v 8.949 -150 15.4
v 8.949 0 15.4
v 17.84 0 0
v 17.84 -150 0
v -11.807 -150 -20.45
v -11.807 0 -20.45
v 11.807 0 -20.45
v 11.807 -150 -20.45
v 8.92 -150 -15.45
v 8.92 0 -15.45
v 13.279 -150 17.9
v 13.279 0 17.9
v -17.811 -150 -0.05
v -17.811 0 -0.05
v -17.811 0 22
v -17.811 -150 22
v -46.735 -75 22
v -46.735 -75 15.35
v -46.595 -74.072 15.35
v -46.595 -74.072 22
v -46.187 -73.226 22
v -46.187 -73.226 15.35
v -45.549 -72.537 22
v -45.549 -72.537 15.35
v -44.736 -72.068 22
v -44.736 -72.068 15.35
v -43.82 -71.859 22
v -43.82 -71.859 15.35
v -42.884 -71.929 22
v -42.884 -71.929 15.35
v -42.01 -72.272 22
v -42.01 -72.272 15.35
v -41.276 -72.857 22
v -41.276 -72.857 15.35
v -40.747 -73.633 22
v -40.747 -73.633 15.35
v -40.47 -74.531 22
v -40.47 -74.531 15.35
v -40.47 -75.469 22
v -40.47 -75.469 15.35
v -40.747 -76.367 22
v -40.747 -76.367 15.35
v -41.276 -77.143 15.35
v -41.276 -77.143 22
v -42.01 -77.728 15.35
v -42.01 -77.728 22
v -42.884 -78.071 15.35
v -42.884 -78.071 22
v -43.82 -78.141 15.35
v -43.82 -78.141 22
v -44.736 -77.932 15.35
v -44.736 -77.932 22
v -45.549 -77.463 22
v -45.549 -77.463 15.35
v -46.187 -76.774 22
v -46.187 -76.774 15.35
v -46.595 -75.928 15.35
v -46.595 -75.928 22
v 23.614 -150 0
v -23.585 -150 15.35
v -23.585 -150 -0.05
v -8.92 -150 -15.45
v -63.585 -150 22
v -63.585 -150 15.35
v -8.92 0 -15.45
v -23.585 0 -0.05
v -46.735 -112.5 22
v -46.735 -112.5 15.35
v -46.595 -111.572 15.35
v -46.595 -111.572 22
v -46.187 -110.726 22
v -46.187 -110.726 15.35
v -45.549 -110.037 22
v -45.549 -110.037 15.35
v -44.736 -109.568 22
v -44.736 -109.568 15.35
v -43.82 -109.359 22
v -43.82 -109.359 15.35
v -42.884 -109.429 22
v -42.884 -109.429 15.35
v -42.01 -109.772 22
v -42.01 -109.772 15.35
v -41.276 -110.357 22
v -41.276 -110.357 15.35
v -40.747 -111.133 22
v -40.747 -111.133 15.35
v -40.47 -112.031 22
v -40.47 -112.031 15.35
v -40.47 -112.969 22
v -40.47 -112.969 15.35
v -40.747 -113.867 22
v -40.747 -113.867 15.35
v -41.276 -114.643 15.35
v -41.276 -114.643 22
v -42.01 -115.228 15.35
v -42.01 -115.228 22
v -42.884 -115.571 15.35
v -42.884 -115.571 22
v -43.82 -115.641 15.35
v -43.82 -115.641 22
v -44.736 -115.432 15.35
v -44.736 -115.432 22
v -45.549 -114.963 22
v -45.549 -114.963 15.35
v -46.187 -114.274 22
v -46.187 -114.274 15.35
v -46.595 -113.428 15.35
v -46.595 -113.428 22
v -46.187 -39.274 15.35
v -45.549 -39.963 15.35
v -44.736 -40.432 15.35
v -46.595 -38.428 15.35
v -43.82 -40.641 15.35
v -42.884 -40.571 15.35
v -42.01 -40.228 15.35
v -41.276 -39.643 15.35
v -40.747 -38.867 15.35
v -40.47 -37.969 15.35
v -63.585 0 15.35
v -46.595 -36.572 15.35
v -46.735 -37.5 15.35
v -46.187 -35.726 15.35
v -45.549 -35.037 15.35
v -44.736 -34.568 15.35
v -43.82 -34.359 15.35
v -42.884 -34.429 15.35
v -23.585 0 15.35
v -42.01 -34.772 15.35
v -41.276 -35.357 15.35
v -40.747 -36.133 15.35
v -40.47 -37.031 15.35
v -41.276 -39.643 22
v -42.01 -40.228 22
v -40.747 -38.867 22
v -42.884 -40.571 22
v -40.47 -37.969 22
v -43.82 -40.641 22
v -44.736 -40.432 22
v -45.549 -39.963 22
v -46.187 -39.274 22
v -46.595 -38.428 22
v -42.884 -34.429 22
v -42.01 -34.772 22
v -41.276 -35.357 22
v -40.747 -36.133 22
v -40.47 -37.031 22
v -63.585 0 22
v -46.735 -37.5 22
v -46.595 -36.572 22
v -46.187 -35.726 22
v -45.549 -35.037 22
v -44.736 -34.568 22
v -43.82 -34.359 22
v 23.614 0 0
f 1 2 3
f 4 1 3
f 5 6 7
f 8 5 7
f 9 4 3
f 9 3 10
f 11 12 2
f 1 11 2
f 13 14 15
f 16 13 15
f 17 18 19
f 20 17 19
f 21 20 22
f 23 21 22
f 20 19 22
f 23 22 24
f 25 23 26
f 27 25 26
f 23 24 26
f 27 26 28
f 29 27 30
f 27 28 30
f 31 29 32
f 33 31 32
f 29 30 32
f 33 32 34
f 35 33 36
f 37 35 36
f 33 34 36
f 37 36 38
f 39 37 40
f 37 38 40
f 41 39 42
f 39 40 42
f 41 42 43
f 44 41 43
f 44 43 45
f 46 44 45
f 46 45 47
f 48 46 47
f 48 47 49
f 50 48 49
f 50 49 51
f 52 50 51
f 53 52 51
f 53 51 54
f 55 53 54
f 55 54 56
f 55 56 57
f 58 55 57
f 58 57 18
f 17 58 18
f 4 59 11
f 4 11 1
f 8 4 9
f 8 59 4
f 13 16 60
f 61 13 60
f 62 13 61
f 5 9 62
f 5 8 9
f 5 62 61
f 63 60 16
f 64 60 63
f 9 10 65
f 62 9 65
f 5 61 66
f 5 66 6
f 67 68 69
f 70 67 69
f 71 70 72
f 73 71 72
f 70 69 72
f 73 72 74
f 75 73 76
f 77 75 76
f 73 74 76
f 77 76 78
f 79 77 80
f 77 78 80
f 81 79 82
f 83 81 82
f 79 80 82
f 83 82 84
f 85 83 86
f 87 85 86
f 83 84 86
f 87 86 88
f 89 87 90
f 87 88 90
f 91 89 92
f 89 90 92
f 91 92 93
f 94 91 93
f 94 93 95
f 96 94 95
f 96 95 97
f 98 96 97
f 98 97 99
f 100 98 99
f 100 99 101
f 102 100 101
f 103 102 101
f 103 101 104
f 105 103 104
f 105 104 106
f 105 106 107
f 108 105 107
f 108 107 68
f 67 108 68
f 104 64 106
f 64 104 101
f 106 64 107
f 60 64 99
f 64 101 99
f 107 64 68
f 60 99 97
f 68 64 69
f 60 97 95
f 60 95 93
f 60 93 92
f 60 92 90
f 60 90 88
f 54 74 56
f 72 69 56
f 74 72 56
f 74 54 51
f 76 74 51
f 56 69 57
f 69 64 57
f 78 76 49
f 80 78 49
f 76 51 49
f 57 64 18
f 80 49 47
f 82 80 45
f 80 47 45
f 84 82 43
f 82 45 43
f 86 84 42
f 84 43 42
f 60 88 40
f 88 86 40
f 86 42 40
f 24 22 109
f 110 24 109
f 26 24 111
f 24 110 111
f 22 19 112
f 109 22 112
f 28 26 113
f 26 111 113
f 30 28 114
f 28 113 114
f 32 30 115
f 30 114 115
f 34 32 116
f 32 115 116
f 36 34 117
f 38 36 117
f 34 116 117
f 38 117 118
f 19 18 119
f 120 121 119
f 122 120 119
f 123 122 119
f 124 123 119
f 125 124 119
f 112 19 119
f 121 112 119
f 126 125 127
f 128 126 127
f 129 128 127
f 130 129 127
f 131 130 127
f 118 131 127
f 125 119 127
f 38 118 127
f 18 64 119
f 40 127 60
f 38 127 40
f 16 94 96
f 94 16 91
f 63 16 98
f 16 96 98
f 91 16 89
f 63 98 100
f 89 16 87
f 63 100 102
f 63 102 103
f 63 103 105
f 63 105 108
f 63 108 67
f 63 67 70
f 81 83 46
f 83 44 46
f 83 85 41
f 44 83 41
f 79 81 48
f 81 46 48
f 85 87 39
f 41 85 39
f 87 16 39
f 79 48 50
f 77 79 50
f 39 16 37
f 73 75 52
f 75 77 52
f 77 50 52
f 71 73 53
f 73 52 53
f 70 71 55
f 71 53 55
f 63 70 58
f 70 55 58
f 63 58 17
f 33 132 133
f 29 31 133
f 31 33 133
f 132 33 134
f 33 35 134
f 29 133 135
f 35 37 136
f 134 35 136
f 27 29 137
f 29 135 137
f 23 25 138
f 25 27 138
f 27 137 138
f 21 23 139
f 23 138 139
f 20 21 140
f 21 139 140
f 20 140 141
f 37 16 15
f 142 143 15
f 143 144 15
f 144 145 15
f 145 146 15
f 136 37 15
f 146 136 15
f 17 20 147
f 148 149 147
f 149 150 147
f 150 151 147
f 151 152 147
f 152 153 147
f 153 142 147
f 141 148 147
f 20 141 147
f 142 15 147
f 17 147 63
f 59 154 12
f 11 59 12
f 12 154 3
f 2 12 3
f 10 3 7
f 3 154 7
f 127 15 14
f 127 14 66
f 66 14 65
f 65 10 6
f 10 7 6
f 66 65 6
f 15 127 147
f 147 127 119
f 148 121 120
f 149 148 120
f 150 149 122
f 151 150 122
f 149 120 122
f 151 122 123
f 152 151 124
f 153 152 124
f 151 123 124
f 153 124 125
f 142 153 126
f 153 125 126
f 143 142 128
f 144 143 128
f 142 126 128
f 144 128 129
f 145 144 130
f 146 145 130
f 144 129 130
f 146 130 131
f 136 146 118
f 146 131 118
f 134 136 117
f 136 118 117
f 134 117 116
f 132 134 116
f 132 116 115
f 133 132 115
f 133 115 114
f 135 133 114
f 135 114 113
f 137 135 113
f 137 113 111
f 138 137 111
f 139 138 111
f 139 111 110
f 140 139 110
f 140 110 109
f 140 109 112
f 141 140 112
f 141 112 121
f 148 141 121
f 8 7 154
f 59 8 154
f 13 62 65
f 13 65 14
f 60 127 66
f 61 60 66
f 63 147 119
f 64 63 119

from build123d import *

# Parameters (mm, degrees)
BOSS_EXTRUDE3_DEPTH = 150
SKETCH5_R           = 3.15
CUT_EXTRUDE1_DEPTH  = 10


with BuildPart() as part:
    # Sketch4 → Boss-Extrude3 (new body)
    with BuildSketch(Plane(origin=(0, 0, 0), x_dir=(1, 0, 0), z_dir=(0, 1, 0))):
        Polygon((8.948929172, -15.4), (17.840123318, 0), (8.920061659, 15.45), (-8.920061659, 15.45), (-17.811255804, 0.05), (-17.811255804, -22), (-63.584758496, -22), (-63.584758496, -15.35), (-23.584758496, -15.35), (-23.584758496, 0.05), (-11.806813005, 20.45), (11.806813005, 20.45), (23.61362601, 0), (13.279056191, -17.9), align=None)
    extrude(amount=-BOSS_EXTRUDE3_DEPTH)

    # Sketch5 → Cut-Extrude1 (cut)
    with BuildSketch(Plane(origin=(0, 0, 15.35), x_dir=(-1, 0, 0), z_dir=(0, 0, -1))):
        with Locations((43.584758496, -37.5)):
            Circle(SKETCH5_R)
        with Locations((43.584758496, -75)):
            Circle(SKETCH5_R)
        with Locations((43.584758496, -112.5)):
            Circle(SKETCH5_R)
    extrude(amount=-CUT_EXTRUDE1_DEPTH, mode=Mode.SUBTRACT)


solid = part.part
